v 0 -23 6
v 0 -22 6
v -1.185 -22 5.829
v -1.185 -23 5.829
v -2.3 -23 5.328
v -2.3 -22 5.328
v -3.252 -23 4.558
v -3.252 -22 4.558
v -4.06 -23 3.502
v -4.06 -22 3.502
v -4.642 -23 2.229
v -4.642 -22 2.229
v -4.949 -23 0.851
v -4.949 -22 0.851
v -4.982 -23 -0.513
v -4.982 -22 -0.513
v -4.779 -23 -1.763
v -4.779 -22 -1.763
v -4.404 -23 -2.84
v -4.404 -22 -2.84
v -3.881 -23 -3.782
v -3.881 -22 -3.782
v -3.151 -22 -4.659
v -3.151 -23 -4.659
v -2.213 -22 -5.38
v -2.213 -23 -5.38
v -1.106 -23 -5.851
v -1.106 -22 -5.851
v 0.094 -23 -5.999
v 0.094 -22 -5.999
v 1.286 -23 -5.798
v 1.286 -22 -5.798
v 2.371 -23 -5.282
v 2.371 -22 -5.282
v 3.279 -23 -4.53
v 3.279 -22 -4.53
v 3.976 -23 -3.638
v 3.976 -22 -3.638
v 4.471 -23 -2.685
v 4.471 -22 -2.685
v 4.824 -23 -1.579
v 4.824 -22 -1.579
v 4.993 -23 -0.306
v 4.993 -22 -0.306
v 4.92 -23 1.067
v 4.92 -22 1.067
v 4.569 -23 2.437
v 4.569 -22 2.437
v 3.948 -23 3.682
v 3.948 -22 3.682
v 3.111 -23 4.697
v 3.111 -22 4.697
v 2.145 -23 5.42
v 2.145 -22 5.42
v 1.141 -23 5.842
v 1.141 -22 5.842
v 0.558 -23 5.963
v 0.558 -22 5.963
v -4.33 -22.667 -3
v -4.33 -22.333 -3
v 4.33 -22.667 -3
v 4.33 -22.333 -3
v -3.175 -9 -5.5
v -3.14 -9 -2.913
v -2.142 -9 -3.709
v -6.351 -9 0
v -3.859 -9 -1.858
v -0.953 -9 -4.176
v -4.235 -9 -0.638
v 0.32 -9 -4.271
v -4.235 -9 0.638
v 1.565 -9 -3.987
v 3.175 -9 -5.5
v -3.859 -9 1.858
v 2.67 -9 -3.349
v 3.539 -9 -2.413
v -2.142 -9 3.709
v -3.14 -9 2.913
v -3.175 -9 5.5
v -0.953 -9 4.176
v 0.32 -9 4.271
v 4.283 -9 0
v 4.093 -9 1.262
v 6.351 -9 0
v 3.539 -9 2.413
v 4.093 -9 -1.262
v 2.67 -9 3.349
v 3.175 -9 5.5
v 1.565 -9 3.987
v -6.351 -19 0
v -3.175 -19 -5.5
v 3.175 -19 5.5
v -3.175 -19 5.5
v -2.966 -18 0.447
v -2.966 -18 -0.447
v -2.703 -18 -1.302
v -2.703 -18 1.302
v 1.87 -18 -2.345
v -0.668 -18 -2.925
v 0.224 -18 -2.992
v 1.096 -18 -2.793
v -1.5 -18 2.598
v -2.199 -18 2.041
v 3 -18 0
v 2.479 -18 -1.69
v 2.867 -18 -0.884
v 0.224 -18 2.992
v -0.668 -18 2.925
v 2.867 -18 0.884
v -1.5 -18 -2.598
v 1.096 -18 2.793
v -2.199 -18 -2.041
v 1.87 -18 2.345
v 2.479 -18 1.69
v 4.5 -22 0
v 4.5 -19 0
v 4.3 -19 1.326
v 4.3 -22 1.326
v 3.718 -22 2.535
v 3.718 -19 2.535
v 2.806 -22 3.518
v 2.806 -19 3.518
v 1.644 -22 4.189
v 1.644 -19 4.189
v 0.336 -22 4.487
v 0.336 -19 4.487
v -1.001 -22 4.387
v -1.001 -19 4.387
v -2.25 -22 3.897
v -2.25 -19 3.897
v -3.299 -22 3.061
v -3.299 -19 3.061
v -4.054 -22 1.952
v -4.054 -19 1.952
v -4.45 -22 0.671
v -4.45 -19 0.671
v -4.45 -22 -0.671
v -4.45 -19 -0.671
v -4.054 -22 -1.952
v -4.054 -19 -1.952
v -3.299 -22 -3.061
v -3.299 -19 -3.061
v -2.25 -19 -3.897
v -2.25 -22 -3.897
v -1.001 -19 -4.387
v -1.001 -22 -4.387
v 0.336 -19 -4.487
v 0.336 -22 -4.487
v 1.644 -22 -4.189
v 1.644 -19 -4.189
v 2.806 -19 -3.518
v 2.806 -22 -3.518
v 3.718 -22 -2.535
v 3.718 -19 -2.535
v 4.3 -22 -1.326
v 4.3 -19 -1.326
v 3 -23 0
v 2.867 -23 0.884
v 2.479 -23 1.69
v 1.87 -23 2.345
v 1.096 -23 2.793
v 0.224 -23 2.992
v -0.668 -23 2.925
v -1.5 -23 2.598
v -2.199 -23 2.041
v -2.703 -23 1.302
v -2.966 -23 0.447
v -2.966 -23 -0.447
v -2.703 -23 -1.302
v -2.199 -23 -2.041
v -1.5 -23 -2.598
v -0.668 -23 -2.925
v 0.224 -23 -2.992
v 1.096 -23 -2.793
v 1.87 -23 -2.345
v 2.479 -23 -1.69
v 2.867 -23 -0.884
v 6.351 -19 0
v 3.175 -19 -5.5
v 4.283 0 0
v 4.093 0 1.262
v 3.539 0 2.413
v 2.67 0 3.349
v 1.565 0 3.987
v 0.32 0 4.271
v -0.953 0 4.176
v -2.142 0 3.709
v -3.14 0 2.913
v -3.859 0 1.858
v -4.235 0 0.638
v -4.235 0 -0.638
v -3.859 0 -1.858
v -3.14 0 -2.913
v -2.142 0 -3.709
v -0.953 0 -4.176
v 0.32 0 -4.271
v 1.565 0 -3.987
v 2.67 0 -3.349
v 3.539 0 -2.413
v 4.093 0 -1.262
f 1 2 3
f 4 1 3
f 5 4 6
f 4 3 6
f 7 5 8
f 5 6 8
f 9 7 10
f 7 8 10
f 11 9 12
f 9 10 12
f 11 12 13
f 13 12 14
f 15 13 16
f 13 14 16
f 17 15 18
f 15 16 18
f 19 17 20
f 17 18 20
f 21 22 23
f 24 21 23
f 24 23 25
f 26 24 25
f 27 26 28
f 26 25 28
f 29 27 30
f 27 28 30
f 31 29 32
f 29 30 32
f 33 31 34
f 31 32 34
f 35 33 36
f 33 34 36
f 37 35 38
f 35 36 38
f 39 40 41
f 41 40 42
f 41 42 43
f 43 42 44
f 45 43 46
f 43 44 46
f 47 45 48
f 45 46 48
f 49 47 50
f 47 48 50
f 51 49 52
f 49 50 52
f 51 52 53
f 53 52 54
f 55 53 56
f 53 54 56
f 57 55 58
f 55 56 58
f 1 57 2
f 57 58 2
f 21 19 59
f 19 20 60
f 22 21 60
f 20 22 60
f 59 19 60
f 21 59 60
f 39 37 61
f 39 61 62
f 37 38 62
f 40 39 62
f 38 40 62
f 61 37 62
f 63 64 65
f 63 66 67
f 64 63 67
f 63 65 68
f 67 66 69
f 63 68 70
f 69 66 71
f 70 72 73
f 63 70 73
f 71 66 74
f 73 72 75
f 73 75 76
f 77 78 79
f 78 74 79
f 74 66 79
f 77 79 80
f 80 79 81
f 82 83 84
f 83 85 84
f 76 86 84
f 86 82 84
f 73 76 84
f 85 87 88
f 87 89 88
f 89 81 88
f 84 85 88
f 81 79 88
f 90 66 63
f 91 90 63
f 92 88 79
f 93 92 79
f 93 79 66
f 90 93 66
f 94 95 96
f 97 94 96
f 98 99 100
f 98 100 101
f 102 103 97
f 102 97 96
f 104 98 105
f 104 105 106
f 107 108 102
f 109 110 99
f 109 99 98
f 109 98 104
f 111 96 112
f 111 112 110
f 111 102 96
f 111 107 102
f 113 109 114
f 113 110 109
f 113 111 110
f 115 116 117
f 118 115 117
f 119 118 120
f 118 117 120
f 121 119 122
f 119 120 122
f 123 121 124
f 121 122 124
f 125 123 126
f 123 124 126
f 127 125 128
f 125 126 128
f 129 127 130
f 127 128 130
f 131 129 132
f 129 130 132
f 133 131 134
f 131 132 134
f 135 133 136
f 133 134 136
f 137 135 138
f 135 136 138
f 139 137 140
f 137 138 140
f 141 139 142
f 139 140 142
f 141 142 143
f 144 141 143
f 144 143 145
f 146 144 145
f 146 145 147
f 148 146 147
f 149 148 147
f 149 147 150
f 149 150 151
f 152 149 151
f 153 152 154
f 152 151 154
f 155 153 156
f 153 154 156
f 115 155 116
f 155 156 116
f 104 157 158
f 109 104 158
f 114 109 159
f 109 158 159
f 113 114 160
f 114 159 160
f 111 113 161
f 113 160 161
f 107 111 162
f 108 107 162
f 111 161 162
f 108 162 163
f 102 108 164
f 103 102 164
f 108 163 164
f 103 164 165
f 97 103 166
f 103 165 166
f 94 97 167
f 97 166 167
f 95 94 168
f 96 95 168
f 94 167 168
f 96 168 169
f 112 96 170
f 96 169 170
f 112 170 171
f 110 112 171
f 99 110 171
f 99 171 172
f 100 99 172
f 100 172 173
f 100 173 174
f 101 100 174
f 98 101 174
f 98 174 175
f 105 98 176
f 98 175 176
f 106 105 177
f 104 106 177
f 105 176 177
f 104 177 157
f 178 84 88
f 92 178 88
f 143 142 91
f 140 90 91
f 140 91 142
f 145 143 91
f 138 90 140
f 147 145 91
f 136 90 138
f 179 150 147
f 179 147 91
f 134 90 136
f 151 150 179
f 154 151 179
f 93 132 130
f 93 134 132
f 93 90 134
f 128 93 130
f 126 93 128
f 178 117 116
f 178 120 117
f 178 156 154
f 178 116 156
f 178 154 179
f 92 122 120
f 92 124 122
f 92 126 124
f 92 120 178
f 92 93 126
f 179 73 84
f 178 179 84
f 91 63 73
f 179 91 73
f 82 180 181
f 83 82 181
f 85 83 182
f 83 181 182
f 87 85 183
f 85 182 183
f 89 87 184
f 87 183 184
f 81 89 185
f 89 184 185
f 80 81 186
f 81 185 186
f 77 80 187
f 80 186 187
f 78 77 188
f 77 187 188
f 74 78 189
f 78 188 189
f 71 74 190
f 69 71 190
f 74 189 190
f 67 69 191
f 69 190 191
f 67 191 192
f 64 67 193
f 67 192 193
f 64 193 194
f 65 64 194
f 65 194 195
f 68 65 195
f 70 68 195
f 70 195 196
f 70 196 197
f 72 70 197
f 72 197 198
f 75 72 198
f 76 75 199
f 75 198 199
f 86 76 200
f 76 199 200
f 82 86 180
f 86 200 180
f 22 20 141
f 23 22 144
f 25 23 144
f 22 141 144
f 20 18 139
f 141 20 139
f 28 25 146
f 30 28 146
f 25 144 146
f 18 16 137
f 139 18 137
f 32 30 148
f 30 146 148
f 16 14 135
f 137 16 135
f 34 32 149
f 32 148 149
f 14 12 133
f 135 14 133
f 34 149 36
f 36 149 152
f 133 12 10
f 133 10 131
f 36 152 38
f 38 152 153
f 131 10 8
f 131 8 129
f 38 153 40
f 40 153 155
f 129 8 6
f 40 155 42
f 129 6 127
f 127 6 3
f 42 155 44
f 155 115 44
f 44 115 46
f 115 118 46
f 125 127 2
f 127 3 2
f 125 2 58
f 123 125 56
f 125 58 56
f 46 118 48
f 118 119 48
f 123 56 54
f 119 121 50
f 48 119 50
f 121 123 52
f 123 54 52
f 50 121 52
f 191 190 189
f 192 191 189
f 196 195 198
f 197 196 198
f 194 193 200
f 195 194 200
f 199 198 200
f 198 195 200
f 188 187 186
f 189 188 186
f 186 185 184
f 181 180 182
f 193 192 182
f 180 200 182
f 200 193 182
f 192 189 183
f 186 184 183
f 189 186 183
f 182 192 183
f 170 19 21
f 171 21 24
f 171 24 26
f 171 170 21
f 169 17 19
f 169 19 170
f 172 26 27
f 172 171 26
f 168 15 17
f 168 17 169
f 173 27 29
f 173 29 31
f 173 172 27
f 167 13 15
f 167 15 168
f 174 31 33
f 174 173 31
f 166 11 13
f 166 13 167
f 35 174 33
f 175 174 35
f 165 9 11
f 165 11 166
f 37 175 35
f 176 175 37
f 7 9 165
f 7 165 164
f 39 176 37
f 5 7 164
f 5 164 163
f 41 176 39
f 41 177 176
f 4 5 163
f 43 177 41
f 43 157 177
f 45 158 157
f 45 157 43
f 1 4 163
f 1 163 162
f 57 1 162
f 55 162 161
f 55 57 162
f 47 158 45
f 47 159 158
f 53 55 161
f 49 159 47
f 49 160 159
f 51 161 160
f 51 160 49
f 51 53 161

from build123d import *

# Parameters (mm, degrees)
F0_R     = 4.283
F1_DEPTH = 9
F2_R     = 4.283
F3_DEPTH = 10
F4_R     = 4.5
F5_DEPTH = 3
F7_DEPTH = 1
F8_R     = 3
F9_DEPTH = 5


# Not quite as in the source:
# - a feature names something its author has since deleted; it is built from what else it names


with BuildPart() as f1:
    # F0 (on Front) → F1 (new body)
    with BuildSketch(Plane.XZ):
        Circle(F0_R)
    extrude(amount=F1_DEPTH)

    # F2 (on face) → F3 (join)
    with BuildSketch(Plane.XZ.offset(9)):
        Polygon((3.1754264805, 5.5), (-3.1754264805, 5.5), (-6.3508529611, 0), (-3.1754264805, -5.5), (3.1754264805, -5.5), (6.3508529611, 0), align=None)
        Circle(F2_R, mode=Mode.SUBTRACT)
        Circle(F2_R)
    extrude(amount=F3_DEPTH)

    # F4 (on face) → F5 (join)
    with BuildSketch(Plane.XZ.offset(19)):
        Circle(F4_R)
    extrude(amount=F5_DEPTH)

    # F6 (on face) → F7 (join)
    with BuildSketch(Plane.XZ.offset(22)):
        with BuildLine():
            add(Edge.make_bspline(
                [(0, 6), (-8.6602540378, 6), (-4.3301270189, -3), (0, -12), (4.3301270189, -3), (8.6602540378, 6), (0, 6)],
                knots=[0, 0, 0, 2.0943951024, 2.0943951024, 4.1887902048, 4.1887902048, 6.2831853072, 6.2831853072, 6.2831853072], degree=2, weights=[1, 0.5, 1, 0.5, 1, 0.5, 1]))
        make_face()
    extrude(amount=F7_DEPTH)

    # F8 (on face) → F9 (cut)
    with BuildSketch(Plane.XZ.offset(23)):
        Circle(F8_R)
    extrude(amount=-F9_DEPTH, mode=Mode.SUBTRACT)


solid = f1.part
